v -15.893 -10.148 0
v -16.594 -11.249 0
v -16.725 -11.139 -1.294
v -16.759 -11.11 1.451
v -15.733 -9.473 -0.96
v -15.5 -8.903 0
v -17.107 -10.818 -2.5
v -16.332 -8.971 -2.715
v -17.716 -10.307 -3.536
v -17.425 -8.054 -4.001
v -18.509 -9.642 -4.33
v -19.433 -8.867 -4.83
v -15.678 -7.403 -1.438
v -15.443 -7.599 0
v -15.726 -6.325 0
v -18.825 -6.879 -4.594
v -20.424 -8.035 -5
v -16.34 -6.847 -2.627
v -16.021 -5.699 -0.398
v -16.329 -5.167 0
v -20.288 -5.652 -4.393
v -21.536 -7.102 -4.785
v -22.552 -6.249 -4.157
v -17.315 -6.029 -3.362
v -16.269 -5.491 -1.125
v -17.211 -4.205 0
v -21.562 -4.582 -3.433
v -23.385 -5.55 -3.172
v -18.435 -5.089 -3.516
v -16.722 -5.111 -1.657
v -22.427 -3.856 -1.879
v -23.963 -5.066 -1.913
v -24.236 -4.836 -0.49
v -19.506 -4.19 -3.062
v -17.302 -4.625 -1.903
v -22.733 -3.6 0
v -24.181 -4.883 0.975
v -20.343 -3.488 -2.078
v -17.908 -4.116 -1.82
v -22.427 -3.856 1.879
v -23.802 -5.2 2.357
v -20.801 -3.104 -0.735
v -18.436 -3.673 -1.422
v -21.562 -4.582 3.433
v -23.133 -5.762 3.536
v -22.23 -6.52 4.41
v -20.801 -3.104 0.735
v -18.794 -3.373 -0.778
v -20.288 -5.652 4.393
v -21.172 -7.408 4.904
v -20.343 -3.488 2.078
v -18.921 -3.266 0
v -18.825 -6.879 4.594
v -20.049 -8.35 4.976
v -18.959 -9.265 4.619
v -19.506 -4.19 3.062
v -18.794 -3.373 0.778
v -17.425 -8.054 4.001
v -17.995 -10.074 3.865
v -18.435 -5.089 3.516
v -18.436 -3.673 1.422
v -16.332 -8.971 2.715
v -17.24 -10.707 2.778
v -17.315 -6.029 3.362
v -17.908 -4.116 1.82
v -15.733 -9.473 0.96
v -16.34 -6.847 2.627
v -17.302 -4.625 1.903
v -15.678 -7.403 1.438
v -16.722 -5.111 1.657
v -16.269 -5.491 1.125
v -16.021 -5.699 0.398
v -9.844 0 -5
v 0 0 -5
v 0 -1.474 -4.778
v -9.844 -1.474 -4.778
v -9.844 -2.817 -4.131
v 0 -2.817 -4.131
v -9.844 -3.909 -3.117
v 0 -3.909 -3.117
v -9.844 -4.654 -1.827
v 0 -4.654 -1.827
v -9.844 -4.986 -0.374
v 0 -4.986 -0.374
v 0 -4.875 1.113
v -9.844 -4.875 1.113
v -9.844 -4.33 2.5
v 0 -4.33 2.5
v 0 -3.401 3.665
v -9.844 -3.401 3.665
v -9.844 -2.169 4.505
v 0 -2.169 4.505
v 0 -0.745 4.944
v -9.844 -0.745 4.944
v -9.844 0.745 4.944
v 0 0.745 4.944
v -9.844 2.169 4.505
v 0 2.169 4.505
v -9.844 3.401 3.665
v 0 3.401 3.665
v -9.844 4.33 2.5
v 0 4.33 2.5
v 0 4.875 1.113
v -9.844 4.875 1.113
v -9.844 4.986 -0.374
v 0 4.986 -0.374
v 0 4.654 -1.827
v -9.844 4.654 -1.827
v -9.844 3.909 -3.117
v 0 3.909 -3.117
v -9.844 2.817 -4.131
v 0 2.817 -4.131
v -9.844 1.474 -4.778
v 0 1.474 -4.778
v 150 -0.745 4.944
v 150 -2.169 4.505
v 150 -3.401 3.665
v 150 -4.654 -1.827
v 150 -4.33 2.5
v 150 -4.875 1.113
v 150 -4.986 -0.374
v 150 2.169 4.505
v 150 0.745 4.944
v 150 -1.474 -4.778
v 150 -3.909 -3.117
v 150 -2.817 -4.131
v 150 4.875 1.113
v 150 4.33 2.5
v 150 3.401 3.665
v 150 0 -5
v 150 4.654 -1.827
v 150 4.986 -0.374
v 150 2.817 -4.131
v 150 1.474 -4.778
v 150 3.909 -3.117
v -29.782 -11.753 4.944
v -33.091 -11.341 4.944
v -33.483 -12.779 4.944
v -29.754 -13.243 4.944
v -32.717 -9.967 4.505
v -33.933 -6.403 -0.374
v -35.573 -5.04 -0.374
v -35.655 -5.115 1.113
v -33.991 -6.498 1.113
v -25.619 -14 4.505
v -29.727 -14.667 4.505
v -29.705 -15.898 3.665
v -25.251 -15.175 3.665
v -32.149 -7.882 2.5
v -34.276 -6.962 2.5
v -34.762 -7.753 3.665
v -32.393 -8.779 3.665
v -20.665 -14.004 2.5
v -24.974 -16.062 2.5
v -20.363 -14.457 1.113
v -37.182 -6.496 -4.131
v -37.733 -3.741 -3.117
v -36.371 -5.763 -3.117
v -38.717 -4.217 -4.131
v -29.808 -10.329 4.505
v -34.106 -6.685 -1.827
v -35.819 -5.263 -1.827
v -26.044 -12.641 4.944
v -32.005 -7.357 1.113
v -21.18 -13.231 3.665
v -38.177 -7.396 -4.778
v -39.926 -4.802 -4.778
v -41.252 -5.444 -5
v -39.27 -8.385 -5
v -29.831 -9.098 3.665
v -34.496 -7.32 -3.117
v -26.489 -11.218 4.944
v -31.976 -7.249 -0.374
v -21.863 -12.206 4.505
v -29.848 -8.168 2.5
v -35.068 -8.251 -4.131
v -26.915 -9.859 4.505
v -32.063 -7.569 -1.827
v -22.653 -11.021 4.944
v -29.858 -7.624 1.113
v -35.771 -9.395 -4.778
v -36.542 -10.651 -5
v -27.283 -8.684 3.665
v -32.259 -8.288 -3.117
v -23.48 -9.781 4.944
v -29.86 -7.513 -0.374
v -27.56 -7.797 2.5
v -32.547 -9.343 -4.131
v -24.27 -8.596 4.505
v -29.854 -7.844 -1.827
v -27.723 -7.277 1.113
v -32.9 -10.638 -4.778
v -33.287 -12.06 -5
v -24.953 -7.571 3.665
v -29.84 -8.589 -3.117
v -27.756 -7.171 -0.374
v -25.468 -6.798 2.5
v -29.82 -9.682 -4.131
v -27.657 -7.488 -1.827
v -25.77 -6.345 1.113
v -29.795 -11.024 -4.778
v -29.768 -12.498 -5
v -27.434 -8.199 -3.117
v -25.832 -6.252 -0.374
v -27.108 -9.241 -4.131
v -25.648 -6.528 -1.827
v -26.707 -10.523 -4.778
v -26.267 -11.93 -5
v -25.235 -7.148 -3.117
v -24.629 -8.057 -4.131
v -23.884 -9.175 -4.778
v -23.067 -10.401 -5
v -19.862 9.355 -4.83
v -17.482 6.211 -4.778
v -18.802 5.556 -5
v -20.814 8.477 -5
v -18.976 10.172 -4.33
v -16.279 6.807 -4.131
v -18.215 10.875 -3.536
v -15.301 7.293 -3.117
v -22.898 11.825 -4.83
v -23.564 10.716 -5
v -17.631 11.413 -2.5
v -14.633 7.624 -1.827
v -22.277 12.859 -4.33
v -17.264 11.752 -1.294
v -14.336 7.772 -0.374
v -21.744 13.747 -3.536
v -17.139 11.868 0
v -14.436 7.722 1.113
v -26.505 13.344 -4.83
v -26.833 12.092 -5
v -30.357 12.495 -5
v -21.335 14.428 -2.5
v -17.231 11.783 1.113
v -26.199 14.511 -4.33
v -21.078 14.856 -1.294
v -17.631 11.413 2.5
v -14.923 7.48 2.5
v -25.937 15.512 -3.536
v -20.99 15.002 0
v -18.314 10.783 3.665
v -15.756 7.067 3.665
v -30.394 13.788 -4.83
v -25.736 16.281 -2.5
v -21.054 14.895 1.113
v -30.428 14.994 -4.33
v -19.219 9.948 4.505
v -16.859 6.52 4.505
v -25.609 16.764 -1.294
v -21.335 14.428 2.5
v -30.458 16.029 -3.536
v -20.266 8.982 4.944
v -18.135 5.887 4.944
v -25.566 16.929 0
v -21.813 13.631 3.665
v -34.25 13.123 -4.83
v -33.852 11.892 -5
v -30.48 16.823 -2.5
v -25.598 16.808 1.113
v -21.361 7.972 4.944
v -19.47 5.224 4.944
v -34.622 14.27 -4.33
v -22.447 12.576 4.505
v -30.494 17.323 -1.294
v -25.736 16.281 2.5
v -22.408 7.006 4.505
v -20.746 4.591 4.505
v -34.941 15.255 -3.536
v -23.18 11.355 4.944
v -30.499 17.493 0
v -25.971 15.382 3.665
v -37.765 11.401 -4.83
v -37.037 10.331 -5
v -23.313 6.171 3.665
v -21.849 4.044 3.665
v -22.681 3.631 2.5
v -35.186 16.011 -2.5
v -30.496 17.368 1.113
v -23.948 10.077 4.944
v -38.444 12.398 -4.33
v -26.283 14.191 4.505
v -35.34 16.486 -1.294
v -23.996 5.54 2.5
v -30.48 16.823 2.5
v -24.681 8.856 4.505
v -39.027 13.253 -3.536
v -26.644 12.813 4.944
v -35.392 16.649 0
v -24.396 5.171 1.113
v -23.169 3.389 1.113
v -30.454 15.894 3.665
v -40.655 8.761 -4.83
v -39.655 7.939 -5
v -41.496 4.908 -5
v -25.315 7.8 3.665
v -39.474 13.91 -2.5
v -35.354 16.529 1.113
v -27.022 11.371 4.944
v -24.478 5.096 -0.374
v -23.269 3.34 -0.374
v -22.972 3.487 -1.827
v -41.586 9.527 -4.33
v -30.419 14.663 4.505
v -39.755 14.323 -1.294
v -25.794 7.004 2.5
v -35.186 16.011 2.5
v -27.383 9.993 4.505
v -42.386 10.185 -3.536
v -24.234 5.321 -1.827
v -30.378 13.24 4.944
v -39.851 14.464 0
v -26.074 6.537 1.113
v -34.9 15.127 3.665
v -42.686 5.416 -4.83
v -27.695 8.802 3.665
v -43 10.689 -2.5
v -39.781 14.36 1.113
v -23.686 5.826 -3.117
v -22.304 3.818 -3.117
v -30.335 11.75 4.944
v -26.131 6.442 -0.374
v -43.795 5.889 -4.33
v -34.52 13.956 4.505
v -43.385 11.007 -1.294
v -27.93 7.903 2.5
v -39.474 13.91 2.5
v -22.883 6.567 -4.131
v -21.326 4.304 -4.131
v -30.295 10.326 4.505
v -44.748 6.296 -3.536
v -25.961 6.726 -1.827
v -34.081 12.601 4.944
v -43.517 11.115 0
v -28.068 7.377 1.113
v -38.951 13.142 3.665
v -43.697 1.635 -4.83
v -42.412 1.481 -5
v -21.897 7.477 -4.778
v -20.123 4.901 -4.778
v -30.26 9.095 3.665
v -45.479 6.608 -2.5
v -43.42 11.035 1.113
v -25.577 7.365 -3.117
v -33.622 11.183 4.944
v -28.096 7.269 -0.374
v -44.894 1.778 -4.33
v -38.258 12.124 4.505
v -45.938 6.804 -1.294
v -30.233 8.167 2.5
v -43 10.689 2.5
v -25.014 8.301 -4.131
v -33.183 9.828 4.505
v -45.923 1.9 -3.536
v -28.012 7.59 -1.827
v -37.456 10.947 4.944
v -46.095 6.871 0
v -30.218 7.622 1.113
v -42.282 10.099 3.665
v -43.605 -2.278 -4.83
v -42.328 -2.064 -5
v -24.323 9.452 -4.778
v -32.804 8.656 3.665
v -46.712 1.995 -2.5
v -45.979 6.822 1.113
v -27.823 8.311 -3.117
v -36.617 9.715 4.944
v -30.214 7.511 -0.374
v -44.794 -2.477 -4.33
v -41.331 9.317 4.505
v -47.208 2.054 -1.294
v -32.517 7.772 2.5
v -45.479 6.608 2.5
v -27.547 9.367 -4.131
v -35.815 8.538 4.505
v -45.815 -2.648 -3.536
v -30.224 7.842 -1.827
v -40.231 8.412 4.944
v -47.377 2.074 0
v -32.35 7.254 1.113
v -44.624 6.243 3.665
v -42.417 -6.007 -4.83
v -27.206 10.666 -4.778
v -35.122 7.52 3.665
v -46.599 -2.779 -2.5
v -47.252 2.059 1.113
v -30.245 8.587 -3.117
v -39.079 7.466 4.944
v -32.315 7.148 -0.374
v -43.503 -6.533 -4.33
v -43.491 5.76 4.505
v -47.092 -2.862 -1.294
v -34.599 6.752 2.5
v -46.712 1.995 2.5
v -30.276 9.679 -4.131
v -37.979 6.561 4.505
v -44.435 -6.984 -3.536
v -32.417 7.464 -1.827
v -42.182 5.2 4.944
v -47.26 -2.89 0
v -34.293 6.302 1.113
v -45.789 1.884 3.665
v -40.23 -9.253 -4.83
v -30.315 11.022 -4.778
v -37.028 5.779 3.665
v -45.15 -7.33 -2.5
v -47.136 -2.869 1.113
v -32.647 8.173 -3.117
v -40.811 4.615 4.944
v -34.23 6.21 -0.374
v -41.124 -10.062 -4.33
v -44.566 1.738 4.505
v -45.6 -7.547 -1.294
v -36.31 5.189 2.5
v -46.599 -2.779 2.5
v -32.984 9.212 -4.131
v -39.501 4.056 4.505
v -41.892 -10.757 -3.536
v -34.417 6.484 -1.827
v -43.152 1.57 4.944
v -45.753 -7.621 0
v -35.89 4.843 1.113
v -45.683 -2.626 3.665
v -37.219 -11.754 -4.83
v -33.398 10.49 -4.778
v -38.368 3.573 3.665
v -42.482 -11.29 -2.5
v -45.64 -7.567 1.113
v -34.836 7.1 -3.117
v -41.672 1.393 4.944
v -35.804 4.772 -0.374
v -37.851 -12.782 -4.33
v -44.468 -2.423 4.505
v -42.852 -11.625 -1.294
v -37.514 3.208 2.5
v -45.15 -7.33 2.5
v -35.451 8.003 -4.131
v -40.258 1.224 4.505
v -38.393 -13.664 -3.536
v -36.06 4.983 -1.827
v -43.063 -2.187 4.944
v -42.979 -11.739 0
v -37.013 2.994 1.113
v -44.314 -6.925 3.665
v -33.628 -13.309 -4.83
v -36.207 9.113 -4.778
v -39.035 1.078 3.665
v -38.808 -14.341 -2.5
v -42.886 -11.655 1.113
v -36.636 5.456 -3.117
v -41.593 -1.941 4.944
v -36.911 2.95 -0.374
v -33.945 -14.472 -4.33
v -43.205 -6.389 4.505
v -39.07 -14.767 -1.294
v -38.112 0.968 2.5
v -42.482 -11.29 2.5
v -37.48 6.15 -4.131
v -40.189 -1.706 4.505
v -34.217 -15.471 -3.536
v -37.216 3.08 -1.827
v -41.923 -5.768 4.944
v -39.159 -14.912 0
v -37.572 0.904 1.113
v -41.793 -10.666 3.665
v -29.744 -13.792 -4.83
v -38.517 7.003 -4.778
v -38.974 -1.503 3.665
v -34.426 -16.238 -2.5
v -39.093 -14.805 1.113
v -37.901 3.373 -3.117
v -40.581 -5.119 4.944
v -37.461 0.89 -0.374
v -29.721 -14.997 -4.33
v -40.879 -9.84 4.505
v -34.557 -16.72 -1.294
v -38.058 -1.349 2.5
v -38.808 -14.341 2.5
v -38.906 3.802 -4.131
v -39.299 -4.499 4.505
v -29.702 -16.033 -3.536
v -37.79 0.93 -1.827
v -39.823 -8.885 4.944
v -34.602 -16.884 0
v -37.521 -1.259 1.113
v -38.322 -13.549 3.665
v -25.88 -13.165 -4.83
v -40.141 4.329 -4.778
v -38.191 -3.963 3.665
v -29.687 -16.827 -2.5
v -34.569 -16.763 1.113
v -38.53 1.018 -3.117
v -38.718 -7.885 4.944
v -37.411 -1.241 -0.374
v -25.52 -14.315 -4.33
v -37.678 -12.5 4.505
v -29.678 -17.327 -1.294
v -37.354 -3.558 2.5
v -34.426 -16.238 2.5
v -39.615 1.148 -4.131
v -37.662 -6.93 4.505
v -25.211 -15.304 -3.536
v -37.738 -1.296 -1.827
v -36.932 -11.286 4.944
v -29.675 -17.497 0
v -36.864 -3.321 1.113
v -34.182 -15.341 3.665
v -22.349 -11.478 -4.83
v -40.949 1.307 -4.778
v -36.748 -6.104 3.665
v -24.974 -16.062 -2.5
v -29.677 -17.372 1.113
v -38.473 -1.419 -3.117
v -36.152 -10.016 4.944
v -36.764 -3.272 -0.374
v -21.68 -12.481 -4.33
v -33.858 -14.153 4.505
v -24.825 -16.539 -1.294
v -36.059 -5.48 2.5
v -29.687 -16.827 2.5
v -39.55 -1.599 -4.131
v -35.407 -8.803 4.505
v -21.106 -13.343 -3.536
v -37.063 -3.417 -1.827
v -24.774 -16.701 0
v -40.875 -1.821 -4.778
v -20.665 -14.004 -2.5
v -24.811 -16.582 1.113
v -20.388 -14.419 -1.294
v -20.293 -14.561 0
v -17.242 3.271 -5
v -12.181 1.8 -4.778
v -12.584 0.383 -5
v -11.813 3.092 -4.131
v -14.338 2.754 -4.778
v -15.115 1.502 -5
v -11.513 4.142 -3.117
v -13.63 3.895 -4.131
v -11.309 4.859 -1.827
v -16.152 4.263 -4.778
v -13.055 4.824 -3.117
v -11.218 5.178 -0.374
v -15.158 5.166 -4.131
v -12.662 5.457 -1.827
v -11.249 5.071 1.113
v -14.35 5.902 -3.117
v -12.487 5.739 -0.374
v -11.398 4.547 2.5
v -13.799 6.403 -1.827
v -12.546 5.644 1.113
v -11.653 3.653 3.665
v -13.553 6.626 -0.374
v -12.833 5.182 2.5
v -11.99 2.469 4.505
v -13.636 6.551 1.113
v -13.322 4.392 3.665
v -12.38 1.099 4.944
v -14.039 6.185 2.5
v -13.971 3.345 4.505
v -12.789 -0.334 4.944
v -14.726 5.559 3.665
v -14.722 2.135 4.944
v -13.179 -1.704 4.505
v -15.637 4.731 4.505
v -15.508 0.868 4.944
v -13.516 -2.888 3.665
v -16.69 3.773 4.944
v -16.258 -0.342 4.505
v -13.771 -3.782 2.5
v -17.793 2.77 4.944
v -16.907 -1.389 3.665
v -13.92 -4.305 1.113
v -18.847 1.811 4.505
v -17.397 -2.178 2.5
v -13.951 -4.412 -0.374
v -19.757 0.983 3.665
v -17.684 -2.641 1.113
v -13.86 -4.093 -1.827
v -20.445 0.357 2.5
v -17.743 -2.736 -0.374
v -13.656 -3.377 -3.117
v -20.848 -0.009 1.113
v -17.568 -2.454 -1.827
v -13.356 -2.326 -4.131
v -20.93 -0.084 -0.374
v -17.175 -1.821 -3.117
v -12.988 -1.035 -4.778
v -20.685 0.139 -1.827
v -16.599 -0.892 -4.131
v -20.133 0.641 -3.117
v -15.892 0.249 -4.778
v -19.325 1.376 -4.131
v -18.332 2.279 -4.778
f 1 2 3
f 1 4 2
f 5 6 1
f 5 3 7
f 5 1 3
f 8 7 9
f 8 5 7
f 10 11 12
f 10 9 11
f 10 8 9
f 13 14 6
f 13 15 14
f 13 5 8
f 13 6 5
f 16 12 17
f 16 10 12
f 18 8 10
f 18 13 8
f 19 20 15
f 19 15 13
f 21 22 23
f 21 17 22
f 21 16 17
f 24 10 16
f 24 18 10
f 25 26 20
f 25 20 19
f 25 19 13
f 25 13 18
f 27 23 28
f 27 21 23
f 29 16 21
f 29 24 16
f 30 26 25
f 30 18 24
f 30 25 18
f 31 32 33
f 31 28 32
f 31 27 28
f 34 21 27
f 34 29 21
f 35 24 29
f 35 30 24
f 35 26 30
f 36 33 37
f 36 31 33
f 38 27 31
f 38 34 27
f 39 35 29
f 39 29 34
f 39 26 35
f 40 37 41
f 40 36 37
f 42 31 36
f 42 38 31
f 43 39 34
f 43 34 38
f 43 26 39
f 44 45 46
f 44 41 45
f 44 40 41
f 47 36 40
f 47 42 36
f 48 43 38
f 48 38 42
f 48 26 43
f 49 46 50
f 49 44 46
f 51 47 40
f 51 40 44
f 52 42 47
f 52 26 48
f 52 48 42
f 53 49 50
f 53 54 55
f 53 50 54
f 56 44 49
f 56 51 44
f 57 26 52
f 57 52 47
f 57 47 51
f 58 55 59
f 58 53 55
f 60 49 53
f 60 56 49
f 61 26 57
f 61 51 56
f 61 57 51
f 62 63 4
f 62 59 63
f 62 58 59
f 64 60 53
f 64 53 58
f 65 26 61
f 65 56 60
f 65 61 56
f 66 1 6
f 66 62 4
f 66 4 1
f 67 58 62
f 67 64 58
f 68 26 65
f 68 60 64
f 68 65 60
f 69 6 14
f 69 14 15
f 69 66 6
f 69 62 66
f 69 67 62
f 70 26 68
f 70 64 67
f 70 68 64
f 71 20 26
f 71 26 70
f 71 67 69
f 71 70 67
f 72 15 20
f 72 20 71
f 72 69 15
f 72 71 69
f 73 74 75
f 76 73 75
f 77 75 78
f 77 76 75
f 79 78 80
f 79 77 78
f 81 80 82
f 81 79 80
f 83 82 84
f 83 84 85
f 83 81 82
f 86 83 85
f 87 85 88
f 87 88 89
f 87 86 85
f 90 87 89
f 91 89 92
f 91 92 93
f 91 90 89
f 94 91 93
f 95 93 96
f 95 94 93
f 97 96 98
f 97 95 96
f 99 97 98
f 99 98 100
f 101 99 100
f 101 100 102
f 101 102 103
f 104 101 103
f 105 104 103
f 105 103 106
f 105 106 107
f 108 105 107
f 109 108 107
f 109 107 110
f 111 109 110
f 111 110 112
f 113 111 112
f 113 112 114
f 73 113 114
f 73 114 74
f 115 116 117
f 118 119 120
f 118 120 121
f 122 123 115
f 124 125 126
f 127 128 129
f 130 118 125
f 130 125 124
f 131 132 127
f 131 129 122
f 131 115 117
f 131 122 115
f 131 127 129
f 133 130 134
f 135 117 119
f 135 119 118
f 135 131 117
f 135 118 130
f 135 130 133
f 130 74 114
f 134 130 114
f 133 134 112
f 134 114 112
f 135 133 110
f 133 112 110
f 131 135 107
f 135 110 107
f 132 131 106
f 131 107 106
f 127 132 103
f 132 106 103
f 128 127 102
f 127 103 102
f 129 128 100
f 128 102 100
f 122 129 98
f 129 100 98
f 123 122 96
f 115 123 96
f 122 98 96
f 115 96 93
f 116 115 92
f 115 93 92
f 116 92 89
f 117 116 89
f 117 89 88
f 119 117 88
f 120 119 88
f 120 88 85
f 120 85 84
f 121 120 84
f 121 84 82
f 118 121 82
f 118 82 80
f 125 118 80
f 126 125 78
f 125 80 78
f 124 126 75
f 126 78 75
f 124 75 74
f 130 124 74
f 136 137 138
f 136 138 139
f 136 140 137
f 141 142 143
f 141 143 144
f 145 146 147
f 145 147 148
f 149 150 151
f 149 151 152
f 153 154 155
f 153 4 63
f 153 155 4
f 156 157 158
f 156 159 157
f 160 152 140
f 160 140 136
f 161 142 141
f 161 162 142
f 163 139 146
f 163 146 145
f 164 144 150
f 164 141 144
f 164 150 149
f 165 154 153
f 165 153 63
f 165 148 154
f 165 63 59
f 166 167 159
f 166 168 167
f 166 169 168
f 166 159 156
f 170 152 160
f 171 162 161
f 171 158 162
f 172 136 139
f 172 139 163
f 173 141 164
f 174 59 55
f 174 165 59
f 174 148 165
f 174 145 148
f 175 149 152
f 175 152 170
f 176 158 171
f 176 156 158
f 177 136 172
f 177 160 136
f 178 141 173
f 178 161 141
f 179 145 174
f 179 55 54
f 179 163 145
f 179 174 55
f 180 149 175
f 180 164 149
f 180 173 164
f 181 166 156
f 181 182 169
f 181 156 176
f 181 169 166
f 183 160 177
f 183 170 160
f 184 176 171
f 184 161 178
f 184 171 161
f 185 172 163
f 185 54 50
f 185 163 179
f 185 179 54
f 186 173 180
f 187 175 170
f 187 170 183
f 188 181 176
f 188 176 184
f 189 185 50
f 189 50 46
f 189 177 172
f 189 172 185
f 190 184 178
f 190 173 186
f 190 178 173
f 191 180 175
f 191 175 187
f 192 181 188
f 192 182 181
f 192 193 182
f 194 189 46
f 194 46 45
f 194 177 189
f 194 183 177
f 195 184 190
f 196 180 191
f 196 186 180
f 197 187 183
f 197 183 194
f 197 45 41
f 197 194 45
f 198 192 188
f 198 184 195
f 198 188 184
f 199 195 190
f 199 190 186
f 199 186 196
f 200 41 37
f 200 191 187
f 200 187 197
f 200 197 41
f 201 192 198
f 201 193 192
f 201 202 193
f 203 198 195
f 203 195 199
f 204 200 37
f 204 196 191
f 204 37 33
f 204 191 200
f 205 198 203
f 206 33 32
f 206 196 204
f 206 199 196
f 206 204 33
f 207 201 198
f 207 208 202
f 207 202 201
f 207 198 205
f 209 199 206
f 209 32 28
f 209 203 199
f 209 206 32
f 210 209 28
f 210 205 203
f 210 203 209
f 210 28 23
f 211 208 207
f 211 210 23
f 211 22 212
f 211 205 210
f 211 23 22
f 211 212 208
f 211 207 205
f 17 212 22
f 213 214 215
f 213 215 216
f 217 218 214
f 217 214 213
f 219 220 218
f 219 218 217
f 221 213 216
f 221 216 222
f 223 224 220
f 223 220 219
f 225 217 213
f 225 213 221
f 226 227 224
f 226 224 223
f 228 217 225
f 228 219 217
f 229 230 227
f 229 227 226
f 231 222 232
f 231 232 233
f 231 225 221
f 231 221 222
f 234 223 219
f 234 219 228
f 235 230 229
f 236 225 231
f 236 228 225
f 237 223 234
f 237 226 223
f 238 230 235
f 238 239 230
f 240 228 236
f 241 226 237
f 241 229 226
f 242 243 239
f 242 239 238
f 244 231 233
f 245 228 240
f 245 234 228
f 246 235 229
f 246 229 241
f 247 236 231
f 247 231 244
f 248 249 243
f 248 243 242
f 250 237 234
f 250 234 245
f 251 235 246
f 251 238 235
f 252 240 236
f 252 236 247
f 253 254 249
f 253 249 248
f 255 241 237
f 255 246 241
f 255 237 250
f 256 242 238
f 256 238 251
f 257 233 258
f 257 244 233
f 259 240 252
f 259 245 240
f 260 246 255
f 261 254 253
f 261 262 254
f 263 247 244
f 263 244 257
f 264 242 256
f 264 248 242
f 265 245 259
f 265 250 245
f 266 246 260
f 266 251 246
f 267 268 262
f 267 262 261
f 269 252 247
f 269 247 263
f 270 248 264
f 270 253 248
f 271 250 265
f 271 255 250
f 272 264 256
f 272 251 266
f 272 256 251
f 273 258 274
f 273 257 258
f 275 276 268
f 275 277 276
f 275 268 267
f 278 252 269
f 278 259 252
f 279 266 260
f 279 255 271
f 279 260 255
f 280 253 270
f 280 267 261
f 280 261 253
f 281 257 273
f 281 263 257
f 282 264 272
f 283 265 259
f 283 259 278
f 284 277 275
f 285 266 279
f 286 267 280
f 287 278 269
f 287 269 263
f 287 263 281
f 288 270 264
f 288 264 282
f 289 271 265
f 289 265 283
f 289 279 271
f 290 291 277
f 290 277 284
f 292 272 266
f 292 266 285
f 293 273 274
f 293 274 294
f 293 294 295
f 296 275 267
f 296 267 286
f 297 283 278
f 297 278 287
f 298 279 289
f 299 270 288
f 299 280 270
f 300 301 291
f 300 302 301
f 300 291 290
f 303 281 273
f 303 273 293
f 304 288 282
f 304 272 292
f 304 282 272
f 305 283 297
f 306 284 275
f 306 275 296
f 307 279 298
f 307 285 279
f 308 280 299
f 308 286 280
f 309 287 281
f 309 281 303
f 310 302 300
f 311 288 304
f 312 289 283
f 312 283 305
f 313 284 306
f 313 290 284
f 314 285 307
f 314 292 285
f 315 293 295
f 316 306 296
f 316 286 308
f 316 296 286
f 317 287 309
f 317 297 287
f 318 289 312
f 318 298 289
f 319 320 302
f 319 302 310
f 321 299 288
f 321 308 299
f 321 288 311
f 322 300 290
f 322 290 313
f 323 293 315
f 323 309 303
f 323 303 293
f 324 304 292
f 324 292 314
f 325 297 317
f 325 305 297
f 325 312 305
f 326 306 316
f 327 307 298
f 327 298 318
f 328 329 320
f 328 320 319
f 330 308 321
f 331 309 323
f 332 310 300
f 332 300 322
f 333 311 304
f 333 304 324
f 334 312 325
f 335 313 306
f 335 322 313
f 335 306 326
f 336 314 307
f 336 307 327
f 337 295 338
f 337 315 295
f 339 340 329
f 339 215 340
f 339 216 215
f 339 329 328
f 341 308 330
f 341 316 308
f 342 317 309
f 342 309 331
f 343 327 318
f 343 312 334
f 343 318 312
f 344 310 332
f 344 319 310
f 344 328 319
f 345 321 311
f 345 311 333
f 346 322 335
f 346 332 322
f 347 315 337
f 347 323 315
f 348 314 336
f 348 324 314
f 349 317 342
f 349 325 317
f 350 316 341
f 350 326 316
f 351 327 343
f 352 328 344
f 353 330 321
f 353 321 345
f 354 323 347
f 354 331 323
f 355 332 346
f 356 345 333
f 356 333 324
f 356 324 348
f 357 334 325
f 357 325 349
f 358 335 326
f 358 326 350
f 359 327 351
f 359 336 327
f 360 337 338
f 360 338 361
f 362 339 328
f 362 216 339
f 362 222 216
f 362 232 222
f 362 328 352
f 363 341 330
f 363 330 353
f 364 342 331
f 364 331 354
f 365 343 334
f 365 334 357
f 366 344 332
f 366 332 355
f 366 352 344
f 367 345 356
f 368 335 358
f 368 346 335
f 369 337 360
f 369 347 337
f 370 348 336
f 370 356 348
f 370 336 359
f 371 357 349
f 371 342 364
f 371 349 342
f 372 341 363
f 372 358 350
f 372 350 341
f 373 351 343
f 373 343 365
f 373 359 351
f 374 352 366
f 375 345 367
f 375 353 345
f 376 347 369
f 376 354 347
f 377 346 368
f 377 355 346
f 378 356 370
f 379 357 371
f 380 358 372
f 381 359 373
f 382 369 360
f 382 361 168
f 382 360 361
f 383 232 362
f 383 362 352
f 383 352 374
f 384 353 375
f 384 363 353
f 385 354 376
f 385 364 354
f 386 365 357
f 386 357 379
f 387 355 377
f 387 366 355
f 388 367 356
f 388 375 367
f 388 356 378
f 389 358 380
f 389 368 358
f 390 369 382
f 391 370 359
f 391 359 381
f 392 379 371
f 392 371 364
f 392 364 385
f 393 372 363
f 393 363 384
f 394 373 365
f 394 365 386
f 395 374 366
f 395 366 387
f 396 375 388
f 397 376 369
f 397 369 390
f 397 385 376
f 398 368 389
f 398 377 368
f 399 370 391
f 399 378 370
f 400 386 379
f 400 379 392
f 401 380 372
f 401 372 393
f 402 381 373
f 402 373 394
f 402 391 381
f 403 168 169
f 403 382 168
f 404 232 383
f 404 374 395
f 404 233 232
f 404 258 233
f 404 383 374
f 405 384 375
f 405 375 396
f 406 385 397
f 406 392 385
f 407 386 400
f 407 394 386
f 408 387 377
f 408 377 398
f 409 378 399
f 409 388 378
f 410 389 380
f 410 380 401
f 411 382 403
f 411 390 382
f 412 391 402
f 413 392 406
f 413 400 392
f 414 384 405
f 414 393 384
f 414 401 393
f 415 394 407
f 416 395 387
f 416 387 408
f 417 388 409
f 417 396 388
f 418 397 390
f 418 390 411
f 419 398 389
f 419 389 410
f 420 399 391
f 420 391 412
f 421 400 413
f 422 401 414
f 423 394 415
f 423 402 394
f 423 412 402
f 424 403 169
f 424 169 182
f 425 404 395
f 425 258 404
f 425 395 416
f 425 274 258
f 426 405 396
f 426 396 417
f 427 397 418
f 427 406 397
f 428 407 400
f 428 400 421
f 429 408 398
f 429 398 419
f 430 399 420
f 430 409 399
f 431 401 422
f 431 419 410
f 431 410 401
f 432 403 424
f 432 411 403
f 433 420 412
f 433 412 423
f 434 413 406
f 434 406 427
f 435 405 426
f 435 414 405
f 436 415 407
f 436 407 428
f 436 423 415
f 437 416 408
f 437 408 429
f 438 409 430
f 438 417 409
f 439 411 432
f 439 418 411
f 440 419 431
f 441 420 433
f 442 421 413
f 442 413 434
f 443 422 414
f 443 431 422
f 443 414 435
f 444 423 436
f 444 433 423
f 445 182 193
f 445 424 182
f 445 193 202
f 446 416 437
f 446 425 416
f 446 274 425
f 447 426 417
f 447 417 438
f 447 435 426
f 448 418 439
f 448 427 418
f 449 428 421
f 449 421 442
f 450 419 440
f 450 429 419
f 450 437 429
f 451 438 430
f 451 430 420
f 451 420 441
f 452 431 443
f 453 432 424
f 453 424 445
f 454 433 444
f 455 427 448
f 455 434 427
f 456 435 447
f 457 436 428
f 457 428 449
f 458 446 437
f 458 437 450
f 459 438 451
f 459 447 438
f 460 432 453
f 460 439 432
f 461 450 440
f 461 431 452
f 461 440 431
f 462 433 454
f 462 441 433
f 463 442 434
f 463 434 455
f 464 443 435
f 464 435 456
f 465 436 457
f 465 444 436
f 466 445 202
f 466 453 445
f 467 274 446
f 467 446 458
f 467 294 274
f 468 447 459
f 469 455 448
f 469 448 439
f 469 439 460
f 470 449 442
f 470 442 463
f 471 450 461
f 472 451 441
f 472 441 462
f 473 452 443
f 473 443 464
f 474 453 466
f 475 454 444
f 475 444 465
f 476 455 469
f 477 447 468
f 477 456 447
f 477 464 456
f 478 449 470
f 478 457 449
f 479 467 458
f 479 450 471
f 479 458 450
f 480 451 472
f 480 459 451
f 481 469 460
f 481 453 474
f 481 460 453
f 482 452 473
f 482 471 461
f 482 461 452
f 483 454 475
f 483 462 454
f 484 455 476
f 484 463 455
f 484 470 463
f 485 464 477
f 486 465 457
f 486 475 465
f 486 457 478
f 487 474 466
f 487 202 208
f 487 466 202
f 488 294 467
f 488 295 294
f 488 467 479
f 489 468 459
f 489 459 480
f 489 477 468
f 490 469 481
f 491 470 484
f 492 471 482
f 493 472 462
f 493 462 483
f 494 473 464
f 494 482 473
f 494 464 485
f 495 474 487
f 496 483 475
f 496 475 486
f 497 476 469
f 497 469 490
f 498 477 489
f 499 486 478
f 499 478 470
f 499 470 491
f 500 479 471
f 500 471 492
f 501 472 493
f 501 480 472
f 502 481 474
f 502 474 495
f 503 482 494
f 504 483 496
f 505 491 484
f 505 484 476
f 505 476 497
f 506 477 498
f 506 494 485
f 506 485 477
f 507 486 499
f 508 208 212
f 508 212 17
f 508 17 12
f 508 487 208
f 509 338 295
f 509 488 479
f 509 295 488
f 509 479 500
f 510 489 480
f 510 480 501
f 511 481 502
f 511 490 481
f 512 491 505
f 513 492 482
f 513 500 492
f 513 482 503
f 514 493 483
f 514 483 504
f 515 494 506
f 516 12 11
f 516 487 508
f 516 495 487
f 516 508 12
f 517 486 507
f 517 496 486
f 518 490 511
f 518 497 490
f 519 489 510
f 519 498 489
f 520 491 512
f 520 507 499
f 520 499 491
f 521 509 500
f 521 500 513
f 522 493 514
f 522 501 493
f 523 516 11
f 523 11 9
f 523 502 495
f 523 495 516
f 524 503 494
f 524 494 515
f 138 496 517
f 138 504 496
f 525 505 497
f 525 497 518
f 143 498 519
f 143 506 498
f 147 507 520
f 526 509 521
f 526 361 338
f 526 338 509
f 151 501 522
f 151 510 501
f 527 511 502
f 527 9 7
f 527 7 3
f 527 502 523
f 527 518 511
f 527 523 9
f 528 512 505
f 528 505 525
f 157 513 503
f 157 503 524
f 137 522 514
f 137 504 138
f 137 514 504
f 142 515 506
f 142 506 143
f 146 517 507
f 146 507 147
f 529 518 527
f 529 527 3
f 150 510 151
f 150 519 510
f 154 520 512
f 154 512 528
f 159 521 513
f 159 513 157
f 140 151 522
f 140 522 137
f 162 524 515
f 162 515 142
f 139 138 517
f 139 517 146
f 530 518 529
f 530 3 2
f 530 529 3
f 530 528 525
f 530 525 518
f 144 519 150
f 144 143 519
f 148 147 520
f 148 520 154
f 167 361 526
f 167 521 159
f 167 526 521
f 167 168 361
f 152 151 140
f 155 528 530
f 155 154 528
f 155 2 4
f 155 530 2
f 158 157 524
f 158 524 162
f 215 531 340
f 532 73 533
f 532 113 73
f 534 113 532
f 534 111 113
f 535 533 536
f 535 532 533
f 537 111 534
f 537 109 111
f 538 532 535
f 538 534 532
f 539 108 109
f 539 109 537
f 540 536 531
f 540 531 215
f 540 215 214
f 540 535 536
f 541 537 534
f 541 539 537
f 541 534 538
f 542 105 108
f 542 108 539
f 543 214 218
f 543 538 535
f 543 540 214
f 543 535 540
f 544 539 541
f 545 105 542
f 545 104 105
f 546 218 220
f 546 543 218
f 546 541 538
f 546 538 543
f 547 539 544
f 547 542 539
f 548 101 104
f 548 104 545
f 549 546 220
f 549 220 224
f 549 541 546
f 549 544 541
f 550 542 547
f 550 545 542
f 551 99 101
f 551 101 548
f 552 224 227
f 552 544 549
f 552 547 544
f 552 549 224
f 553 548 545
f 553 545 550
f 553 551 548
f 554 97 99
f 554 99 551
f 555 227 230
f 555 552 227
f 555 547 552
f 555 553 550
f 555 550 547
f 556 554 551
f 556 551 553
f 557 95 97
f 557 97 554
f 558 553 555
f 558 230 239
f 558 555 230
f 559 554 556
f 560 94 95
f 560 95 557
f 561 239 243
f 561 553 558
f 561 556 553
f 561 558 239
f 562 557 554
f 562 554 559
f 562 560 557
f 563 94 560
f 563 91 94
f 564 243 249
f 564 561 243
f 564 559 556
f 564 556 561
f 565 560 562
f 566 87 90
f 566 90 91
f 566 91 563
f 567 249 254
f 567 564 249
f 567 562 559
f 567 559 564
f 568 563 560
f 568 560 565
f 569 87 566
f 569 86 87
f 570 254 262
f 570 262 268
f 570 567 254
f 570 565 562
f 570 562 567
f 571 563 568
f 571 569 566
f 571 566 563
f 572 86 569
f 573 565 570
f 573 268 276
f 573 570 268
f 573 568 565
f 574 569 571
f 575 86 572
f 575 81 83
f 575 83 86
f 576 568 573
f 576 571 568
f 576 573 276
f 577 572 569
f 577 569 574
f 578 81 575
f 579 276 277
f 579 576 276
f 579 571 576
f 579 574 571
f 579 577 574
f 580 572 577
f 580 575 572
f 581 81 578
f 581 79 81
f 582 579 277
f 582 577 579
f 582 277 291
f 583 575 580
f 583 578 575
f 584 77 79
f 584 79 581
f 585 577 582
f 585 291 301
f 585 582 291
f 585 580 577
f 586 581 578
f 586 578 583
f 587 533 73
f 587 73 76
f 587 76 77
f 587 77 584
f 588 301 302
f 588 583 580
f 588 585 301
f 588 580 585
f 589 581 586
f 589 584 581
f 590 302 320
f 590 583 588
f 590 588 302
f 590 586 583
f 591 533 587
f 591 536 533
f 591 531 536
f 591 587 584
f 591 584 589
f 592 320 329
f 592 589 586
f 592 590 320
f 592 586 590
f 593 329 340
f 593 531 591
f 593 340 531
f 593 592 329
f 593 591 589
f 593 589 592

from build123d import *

# Parameters (mm, degrees)
SKETCH2_R           = 5
DOME3_FACE_RADIUS   = 5
DOME3_HEIGHT        = 5
SKETCH4_R           = 5
BOSS_EXTRUDE2_DEPTH = 150


with BuildPart() as part:
    # Sweep2: sweep along a path in Sketch1
    with BuildLine(Plane.XY) as sweep2_path:
        Line((0, 0), (-9.844355629, 0))
        ThreePointArc((-9.844355629, 0), (-15.114818396, 1.501634144), (-18.802419794, 5.555555556))
        ThreePointArc((-18.802419794, 5.555555556), (-42.411911207, 1.481371052), (-20.424444461, -8.034845121))
    # Sketch2 → Sweep2 (sweep)
    with BuildSketch(Plane(origin=(0, 0, 0), x_dir=(0, 0, -1), z_dir=(1, 0, 0))):
        Circle(SKETCH2_R)
    sweep(path=sweep2_path.line)

    # Dome3: a dome of height H over a round flat face of radius A is a cap of a sphere of radius (A * A + H * H) / (2 * H)
    dome3_r = (DOME3_FACE_RADIUS * DOME3_FACE_RADIUS + DOME3_HEIGHT * DOME3_HEIGHT) / (2 * DOME3_HEIGHT)
    dome3_base = Plane((-20.424444461, -8.034845121, 0), z_dir=(0.64278761, 0.766044443, 0))
    with Locations(dome3_base.offset(DOME3_HEIGHT - dome3_r)):
        dome3_ball = Sphere(dome3_r, mode=Mode.PRIVATE)
    add(split(dome3_ball, bisect_by=dome3_base, keep=Keep.TOP, mode=Mode.PRIVATE))

    # Sketch4 → Boss-Extrude2 (add)
    with BuildSketch(Plane(origin=(0, 0, 0), x_dir=(0, 0, -1), z_dir=(1, 0, 0))):
        Circle(SKETCH4_R)
    extrude(amount=BOSS_EXTRUDE2_DEPTH)


solid = part.part
